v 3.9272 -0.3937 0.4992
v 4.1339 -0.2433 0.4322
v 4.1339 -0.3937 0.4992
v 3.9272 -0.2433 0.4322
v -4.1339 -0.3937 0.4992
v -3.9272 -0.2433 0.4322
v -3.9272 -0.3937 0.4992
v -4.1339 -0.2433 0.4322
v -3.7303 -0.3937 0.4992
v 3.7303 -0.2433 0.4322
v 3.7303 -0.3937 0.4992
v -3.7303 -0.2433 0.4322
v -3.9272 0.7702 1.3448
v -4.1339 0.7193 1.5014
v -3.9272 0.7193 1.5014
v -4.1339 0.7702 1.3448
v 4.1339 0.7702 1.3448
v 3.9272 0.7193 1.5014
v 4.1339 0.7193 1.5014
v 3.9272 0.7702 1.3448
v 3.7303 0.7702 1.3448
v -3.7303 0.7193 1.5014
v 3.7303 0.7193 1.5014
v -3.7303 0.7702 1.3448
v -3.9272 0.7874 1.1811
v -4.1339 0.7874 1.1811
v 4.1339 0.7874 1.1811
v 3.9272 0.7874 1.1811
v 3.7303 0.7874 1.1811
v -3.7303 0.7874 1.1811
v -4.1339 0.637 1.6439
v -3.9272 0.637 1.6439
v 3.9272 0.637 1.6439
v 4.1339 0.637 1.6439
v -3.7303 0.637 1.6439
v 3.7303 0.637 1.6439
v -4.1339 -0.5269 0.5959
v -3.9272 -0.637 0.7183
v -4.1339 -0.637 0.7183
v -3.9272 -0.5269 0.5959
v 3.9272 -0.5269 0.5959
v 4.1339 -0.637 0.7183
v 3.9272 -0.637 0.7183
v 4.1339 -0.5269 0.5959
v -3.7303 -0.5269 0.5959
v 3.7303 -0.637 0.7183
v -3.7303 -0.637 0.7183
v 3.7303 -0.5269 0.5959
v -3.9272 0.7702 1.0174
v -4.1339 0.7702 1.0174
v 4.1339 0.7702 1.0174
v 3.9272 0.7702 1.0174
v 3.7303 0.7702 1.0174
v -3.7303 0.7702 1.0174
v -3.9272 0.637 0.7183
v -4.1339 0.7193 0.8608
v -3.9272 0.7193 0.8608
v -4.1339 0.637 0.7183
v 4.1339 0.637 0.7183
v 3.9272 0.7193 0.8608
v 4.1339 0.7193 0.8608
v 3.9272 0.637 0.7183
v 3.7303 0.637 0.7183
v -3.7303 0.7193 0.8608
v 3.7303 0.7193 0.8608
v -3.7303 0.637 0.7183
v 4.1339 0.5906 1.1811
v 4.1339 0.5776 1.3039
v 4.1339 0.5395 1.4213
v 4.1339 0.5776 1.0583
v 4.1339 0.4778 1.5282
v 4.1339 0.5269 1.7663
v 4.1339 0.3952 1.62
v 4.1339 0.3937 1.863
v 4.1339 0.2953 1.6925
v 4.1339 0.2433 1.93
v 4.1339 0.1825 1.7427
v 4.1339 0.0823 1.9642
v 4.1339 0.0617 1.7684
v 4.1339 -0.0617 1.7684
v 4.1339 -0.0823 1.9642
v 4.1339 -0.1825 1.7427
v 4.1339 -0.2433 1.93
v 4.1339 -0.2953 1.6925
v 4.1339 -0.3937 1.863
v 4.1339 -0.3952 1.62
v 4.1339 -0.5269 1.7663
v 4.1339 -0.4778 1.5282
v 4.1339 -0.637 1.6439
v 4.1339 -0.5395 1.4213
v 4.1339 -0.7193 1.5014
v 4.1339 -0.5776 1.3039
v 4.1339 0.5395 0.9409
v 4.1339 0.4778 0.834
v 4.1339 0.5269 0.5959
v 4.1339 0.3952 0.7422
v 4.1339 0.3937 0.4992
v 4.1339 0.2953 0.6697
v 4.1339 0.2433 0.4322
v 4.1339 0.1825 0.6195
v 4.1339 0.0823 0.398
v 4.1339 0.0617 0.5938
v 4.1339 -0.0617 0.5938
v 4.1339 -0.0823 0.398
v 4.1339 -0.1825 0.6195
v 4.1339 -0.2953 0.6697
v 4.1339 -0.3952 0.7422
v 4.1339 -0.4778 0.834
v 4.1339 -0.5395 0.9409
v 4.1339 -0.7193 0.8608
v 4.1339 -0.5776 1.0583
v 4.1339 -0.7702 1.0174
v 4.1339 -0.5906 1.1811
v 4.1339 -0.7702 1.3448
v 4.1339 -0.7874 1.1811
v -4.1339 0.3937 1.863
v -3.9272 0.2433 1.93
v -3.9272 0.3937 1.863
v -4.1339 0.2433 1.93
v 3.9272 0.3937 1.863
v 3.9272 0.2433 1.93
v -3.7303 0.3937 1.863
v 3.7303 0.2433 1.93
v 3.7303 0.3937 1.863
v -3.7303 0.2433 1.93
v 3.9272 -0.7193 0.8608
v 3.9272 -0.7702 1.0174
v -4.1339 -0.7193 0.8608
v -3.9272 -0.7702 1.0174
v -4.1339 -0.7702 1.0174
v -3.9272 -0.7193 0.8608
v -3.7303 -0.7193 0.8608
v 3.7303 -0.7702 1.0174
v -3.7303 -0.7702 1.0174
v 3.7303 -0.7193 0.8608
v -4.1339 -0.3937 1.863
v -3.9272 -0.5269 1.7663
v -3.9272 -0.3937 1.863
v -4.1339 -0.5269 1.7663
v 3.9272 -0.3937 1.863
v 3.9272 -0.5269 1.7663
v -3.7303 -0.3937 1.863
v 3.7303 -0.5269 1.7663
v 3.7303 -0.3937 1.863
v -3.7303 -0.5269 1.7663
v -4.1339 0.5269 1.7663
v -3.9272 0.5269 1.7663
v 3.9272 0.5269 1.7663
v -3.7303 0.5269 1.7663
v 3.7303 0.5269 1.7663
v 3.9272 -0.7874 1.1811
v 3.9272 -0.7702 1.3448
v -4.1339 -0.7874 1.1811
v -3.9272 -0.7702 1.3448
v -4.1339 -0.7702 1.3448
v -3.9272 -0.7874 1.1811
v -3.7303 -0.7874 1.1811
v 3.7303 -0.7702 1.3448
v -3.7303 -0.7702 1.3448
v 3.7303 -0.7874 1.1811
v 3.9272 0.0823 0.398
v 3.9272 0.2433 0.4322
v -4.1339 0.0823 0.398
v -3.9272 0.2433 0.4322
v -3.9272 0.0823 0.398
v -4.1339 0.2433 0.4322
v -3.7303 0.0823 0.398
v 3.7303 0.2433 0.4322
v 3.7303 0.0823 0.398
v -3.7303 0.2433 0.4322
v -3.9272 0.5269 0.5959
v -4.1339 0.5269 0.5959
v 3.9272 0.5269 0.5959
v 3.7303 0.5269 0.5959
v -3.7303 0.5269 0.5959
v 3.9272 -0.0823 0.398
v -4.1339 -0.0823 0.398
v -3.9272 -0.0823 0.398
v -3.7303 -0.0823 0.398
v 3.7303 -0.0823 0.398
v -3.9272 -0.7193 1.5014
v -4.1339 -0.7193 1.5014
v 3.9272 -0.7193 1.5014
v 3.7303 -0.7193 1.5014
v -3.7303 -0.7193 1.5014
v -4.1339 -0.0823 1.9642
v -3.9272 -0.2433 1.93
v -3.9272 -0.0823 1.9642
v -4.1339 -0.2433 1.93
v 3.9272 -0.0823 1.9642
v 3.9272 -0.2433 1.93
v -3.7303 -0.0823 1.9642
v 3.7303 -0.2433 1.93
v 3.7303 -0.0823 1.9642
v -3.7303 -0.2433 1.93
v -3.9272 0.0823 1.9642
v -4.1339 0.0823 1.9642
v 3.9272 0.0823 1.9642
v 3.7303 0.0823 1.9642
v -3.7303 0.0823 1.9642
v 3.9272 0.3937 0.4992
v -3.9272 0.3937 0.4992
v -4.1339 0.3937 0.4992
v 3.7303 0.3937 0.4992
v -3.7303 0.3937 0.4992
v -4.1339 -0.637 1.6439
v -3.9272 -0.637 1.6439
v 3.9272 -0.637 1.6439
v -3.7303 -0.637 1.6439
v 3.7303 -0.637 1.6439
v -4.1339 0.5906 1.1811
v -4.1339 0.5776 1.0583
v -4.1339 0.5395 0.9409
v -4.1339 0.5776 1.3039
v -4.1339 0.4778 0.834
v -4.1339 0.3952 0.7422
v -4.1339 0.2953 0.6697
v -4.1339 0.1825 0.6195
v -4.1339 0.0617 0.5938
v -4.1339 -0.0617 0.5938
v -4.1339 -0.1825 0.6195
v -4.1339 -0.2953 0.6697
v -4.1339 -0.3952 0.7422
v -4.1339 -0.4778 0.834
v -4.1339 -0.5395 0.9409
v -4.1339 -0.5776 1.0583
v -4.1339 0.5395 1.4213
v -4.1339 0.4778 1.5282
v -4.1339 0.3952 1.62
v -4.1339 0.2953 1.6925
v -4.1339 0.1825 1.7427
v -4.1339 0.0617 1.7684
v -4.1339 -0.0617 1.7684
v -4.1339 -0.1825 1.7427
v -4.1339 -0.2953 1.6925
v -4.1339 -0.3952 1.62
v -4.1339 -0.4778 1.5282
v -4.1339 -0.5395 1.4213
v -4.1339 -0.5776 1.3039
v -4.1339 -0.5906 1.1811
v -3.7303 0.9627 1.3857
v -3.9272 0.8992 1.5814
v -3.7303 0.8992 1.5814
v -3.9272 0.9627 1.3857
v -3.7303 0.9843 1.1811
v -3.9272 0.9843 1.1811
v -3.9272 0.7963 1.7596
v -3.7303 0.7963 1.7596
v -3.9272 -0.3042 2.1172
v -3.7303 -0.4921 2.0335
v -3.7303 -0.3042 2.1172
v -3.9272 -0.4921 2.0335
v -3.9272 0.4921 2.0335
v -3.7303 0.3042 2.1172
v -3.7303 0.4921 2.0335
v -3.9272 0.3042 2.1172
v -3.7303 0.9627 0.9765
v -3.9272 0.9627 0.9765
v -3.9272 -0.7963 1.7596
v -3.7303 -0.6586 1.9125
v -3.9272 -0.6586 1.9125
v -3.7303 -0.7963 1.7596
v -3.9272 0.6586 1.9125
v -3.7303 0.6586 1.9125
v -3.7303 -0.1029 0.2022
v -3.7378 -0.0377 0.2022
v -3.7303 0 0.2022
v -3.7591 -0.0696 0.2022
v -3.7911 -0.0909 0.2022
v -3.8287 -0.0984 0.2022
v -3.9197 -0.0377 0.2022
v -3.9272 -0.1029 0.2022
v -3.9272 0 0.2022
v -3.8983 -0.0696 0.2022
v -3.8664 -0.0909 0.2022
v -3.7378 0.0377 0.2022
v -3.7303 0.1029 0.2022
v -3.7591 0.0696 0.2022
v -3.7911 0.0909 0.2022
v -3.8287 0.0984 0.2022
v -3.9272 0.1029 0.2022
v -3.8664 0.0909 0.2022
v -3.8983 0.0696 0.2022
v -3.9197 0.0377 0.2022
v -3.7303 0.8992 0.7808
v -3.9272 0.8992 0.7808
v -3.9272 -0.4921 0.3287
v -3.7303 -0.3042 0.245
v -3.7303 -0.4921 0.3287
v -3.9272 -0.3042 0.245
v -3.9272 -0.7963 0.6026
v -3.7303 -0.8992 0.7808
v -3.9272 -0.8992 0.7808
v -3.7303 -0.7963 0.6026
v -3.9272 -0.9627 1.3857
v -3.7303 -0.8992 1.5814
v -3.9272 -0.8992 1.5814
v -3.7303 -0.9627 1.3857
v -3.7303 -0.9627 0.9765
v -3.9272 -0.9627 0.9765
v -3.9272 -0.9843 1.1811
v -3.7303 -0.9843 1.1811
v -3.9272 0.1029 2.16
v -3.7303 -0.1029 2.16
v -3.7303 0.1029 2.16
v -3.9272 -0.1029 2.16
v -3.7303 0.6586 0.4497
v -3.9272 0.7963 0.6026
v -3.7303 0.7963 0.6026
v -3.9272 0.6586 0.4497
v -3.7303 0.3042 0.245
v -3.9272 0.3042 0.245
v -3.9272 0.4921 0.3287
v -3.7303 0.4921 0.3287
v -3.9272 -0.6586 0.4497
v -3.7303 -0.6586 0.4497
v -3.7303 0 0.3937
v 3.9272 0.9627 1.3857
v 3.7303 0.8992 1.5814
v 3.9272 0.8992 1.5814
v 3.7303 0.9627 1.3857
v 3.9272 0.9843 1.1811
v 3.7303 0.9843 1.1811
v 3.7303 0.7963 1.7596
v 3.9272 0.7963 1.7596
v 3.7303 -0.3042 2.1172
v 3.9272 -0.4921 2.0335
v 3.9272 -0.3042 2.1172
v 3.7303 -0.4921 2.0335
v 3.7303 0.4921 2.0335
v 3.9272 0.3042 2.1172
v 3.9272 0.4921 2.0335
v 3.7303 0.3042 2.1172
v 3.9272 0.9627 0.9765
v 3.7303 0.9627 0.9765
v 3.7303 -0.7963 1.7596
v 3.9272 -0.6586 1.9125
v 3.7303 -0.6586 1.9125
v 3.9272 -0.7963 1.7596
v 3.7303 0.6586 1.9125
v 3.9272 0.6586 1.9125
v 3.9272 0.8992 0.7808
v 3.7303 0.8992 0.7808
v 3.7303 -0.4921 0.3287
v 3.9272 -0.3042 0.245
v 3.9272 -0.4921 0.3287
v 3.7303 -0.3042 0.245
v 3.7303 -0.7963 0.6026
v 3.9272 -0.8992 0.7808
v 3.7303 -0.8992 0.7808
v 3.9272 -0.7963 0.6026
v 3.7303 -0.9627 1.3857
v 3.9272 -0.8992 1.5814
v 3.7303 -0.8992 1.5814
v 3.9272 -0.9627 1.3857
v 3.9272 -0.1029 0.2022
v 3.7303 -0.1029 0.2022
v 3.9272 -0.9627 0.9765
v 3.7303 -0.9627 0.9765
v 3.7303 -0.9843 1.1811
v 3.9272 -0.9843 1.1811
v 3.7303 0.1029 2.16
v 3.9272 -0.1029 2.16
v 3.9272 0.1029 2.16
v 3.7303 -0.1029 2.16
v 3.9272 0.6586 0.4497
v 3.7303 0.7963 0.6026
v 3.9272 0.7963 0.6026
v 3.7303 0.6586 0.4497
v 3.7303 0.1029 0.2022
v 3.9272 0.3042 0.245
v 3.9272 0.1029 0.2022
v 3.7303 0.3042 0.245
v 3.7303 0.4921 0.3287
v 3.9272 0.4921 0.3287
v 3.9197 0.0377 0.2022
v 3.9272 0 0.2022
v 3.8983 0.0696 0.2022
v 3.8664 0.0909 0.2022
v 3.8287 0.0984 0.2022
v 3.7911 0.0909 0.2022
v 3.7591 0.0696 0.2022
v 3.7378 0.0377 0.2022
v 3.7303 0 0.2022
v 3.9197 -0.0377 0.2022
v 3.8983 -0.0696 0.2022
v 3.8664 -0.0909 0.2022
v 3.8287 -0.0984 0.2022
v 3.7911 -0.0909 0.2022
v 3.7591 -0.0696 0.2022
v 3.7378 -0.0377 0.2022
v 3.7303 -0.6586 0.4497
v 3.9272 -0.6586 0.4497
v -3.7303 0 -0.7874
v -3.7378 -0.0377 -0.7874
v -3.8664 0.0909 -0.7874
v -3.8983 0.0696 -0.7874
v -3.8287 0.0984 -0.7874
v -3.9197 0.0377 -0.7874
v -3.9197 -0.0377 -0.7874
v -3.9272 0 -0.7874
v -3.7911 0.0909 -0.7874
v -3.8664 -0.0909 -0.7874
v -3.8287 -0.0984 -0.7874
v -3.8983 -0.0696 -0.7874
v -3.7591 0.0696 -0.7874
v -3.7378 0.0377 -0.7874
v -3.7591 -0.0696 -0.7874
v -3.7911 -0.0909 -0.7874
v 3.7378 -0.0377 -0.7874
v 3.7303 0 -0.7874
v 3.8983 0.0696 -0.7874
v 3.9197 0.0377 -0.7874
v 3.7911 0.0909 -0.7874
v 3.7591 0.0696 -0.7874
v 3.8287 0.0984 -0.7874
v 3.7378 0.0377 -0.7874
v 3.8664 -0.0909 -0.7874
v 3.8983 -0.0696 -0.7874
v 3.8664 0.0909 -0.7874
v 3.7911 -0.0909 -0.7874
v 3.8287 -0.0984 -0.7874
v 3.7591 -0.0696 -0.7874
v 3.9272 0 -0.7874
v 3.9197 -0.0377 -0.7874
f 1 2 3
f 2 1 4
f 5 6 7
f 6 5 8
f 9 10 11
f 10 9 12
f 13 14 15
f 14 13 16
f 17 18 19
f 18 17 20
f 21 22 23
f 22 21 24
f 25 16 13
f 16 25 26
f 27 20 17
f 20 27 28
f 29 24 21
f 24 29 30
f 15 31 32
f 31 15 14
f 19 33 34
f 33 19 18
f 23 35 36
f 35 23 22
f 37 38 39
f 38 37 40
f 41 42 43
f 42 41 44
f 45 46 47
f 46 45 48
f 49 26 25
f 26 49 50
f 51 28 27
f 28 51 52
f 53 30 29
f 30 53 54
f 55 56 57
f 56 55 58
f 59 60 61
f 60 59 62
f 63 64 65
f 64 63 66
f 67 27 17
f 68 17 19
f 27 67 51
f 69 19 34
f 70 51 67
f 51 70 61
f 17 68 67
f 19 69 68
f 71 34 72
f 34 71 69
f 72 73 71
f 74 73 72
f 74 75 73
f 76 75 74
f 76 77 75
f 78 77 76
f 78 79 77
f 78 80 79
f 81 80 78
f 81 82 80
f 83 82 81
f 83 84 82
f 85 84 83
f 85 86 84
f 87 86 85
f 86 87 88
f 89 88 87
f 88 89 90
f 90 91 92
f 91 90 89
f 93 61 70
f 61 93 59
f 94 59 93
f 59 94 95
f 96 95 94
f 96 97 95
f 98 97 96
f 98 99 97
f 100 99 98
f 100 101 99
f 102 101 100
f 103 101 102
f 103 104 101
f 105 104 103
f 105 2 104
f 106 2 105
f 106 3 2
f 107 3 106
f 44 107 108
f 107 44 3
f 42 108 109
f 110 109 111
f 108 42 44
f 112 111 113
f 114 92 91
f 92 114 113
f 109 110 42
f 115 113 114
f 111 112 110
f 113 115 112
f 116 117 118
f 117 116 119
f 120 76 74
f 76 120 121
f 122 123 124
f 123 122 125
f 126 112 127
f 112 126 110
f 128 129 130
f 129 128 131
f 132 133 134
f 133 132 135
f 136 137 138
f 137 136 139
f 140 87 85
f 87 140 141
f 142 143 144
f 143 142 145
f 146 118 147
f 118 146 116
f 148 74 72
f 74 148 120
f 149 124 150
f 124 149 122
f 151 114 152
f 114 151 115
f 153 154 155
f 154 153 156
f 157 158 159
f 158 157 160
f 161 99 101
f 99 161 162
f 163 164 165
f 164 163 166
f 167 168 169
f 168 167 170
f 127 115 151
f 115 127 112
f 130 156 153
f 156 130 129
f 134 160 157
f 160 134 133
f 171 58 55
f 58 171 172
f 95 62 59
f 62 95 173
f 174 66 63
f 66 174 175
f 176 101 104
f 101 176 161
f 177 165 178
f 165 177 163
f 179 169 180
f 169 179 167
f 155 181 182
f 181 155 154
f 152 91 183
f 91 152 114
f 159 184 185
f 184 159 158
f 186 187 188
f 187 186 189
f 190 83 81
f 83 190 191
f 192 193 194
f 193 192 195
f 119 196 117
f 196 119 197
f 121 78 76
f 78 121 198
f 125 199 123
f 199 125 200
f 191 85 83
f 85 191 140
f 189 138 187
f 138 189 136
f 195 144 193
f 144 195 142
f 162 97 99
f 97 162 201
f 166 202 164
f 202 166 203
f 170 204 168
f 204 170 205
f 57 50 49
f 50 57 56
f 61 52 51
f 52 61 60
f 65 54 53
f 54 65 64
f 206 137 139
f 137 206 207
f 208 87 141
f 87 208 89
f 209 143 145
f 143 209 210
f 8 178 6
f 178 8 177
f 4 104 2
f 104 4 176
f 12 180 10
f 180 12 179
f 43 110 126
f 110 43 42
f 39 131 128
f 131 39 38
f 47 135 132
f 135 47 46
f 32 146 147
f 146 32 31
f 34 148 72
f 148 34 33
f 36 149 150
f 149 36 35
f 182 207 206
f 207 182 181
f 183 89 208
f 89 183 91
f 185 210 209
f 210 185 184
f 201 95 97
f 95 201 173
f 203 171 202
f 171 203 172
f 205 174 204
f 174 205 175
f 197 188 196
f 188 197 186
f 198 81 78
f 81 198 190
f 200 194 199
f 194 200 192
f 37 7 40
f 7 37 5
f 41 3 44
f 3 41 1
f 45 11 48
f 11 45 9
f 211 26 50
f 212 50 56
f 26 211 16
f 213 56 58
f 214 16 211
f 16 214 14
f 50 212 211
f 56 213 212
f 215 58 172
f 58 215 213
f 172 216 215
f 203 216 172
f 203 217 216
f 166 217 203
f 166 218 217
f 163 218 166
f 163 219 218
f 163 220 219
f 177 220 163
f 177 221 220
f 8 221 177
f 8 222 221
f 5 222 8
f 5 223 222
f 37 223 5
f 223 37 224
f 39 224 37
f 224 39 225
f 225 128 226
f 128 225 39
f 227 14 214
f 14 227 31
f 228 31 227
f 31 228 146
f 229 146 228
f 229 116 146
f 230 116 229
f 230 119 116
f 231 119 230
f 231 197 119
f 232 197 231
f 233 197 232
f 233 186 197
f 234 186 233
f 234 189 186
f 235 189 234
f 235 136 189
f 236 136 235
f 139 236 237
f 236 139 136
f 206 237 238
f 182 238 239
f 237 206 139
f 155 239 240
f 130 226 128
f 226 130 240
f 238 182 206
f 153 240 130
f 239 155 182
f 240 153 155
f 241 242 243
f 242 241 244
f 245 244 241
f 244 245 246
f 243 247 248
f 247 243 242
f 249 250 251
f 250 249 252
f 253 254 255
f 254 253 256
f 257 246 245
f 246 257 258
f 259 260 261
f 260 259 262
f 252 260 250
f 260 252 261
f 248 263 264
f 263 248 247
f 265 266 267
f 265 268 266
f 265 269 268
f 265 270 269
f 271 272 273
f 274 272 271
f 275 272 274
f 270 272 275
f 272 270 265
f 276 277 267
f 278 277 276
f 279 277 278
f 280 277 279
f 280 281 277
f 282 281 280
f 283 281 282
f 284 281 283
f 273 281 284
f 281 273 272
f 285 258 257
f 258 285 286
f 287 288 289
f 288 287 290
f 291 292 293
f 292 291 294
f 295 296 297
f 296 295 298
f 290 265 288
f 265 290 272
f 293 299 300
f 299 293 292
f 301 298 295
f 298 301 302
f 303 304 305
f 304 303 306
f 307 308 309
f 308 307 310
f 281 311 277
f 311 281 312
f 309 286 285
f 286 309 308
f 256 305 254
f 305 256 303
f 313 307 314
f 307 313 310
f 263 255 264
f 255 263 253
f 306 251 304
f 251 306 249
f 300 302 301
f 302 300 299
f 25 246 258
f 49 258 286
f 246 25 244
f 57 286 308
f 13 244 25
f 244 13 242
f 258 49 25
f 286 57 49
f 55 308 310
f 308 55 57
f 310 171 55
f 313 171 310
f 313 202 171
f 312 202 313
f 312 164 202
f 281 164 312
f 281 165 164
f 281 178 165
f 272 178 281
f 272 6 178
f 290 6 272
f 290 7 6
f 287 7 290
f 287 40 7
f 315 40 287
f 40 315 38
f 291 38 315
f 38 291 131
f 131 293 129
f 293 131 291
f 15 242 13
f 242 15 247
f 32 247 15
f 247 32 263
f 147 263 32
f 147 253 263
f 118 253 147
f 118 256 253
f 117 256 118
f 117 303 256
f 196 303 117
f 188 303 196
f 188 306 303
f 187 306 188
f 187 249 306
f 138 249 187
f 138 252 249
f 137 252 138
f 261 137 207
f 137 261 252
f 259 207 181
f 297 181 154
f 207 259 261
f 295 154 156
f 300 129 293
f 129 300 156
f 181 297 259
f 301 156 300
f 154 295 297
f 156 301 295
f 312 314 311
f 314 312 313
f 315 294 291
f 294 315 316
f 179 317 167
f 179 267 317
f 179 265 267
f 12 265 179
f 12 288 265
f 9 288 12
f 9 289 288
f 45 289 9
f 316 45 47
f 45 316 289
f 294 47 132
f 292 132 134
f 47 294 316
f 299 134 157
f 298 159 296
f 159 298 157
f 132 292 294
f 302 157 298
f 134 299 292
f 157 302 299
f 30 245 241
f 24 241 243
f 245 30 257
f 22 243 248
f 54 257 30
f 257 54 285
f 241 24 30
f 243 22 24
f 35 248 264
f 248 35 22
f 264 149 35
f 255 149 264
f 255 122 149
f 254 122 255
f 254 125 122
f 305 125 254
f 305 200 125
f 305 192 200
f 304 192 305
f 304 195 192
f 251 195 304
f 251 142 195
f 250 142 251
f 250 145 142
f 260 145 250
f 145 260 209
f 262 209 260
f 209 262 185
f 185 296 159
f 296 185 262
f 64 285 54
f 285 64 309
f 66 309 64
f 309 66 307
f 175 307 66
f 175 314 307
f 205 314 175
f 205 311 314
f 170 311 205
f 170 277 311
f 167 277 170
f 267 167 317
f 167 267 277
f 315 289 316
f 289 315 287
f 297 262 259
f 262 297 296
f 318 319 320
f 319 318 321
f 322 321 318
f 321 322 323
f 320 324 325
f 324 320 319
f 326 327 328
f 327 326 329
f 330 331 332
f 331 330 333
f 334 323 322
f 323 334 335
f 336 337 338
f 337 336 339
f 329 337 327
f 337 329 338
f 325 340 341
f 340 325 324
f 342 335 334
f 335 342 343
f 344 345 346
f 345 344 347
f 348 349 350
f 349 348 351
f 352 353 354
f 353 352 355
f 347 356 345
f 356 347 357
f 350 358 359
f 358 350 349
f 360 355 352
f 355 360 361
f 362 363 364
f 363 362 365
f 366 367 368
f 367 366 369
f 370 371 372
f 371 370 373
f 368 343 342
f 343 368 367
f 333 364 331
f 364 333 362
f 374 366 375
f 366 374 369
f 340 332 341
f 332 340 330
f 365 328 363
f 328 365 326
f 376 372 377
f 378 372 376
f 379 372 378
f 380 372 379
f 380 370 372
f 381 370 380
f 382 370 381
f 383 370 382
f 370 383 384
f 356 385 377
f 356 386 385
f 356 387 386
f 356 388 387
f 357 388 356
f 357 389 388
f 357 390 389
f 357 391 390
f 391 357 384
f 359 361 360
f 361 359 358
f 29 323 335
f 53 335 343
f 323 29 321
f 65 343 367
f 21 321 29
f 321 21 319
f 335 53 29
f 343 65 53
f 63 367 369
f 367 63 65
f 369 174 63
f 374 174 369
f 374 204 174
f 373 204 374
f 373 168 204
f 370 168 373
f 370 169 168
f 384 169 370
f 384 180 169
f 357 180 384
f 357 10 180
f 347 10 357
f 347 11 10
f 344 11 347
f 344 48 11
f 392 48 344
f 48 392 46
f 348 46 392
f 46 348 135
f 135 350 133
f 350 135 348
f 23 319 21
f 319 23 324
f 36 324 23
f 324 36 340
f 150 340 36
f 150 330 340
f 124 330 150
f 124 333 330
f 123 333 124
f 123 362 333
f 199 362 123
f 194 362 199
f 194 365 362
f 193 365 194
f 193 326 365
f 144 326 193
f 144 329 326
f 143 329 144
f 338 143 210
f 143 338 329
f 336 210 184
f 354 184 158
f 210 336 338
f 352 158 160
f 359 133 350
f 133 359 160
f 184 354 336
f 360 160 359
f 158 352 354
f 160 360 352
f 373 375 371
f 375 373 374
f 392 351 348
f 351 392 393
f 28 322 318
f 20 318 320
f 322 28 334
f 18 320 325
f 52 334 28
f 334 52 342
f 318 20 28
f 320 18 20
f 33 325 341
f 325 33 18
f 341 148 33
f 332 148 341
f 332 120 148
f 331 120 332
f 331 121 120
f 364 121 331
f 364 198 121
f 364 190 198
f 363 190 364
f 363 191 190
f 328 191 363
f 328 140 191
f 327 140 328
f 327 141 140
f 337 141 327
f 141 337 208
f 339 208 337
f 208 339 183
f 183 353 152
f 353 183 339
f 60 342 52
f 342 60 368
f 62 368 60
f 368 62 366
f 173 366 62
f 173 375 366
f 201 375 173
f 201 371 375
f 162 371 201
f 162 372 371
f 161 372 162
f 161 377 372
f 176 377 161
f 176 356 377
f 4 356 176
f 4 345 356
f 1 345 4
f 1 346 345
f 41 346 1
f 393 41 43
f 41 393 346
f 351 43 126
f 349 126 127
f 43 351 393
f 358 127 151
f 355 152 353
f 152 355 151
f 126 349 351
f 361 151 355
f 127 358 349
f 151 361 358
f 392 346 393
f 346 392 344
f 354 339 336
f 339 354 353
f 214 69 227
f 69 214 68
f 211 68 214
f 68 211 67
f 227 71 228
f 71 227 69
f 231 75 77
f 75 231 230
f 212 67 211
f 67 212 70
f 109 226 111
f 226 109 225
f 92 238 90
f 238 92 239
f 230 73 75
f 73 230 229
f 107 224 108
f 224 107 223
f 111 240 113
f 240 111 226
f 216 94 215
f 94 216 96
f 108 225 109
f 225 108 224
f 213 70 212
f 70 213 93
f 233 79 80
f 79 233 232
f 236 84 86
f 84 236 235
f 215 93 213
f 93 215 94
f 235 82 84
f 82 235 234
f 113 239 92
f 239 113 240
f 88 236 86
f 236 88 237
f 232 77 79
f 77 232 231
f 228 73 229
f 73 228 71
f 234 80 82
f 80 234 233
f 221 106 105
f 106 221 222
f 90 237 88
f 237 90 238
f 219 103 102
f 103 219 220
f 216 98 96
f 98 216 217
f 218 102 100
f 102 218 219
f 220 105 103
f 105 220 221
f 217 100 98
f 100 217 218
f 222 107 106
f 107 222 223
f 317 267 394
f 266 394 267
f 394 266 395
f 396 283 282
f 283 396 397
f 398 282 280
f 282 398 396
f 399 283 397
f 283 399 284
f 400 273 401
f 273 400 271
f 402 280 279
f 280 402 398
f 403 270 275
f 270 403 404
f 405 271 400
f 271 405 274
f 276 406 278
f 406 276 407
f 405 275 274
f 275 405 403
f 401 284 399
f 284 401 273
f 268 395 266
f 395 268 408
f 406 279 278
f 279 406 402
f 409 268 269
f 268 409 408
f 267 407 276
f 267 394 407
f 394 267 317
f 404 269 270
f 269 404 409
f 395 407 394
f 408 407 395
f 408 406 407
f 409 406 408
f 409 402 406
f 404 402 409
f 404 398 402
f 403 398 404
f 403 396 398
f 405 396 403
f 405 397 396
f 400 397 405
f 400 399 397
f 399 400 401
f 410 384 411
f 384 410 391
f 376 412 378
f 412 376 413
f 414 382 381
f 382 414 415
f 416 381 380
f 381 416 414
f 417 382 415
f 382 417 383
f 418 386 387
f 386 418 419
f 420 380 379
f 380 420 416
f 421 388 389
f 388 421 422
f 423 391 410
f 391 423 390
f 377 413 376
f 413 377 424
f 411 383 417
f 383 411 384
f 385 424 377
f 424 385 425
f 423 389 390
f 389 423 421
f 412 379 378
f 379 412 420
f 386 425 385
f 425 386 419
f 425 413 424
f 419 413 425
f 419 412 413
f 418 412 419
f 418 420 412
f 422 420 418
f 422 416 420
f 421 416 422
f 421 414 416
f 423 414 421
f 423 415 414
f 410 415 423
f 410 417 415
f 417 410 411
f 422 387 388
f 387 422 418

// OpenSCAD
$fs = 0.1;
underground = 2;

module capacitor(_length, _diameter, _wire) {
	_inch = 1 / 2.54;
	_vert_offset = _diameter/2 + _wire + 0.5;
	_thick = _diameter / 4;
	_conn_offset = _length / 40;
	rotate(a = 90, v = [0, 0, 1]) 
	scale(v = [_inch, _inch, _inch]) {
		translate([0, _length / 2, _vert_offset])
		rotate(a = 90, v = [1, 0, 0]) 
		color("silver") difference() {
			union() {
				cylinder(h = _length, d = _diameter);
				translate([0, 0, _conn_offset]) cylinder(h = _wire, d = _diameter + _wire*2);
				translate([0, 0, _length - _conn_offset - _wire]) cylinder(h = _wire, d = _diameter + _wire*2);
			}
			translate([0, 0, -1])
			cylinder(h = _length + 2, d = _diameter - _thick);
		}
	
		translate([0, _length / 2 - _conn_offset - _wire / 2, -underground])
		cylinder(h = _vert_offset - _diameter / 2 + underground, d = _wire);
	
		translate([0, -(_length / 2 - _conn_offset - _wire / 2), -underground])
		cylinder(h = _vert_offset - _diameter / 2 + underground, d = _wire);
	}
}

//capacitor(11, 3, 0.3);
//capacitor(12, 4, 0.5);
//capacitor(14, 3, 0.3);
//capacitor(16.5, 4, 0.5);
//capacitor(17, 3, 0.3);
//capacitor(21, 3, 0.3);
capacitor(21, 4, 0.5);
